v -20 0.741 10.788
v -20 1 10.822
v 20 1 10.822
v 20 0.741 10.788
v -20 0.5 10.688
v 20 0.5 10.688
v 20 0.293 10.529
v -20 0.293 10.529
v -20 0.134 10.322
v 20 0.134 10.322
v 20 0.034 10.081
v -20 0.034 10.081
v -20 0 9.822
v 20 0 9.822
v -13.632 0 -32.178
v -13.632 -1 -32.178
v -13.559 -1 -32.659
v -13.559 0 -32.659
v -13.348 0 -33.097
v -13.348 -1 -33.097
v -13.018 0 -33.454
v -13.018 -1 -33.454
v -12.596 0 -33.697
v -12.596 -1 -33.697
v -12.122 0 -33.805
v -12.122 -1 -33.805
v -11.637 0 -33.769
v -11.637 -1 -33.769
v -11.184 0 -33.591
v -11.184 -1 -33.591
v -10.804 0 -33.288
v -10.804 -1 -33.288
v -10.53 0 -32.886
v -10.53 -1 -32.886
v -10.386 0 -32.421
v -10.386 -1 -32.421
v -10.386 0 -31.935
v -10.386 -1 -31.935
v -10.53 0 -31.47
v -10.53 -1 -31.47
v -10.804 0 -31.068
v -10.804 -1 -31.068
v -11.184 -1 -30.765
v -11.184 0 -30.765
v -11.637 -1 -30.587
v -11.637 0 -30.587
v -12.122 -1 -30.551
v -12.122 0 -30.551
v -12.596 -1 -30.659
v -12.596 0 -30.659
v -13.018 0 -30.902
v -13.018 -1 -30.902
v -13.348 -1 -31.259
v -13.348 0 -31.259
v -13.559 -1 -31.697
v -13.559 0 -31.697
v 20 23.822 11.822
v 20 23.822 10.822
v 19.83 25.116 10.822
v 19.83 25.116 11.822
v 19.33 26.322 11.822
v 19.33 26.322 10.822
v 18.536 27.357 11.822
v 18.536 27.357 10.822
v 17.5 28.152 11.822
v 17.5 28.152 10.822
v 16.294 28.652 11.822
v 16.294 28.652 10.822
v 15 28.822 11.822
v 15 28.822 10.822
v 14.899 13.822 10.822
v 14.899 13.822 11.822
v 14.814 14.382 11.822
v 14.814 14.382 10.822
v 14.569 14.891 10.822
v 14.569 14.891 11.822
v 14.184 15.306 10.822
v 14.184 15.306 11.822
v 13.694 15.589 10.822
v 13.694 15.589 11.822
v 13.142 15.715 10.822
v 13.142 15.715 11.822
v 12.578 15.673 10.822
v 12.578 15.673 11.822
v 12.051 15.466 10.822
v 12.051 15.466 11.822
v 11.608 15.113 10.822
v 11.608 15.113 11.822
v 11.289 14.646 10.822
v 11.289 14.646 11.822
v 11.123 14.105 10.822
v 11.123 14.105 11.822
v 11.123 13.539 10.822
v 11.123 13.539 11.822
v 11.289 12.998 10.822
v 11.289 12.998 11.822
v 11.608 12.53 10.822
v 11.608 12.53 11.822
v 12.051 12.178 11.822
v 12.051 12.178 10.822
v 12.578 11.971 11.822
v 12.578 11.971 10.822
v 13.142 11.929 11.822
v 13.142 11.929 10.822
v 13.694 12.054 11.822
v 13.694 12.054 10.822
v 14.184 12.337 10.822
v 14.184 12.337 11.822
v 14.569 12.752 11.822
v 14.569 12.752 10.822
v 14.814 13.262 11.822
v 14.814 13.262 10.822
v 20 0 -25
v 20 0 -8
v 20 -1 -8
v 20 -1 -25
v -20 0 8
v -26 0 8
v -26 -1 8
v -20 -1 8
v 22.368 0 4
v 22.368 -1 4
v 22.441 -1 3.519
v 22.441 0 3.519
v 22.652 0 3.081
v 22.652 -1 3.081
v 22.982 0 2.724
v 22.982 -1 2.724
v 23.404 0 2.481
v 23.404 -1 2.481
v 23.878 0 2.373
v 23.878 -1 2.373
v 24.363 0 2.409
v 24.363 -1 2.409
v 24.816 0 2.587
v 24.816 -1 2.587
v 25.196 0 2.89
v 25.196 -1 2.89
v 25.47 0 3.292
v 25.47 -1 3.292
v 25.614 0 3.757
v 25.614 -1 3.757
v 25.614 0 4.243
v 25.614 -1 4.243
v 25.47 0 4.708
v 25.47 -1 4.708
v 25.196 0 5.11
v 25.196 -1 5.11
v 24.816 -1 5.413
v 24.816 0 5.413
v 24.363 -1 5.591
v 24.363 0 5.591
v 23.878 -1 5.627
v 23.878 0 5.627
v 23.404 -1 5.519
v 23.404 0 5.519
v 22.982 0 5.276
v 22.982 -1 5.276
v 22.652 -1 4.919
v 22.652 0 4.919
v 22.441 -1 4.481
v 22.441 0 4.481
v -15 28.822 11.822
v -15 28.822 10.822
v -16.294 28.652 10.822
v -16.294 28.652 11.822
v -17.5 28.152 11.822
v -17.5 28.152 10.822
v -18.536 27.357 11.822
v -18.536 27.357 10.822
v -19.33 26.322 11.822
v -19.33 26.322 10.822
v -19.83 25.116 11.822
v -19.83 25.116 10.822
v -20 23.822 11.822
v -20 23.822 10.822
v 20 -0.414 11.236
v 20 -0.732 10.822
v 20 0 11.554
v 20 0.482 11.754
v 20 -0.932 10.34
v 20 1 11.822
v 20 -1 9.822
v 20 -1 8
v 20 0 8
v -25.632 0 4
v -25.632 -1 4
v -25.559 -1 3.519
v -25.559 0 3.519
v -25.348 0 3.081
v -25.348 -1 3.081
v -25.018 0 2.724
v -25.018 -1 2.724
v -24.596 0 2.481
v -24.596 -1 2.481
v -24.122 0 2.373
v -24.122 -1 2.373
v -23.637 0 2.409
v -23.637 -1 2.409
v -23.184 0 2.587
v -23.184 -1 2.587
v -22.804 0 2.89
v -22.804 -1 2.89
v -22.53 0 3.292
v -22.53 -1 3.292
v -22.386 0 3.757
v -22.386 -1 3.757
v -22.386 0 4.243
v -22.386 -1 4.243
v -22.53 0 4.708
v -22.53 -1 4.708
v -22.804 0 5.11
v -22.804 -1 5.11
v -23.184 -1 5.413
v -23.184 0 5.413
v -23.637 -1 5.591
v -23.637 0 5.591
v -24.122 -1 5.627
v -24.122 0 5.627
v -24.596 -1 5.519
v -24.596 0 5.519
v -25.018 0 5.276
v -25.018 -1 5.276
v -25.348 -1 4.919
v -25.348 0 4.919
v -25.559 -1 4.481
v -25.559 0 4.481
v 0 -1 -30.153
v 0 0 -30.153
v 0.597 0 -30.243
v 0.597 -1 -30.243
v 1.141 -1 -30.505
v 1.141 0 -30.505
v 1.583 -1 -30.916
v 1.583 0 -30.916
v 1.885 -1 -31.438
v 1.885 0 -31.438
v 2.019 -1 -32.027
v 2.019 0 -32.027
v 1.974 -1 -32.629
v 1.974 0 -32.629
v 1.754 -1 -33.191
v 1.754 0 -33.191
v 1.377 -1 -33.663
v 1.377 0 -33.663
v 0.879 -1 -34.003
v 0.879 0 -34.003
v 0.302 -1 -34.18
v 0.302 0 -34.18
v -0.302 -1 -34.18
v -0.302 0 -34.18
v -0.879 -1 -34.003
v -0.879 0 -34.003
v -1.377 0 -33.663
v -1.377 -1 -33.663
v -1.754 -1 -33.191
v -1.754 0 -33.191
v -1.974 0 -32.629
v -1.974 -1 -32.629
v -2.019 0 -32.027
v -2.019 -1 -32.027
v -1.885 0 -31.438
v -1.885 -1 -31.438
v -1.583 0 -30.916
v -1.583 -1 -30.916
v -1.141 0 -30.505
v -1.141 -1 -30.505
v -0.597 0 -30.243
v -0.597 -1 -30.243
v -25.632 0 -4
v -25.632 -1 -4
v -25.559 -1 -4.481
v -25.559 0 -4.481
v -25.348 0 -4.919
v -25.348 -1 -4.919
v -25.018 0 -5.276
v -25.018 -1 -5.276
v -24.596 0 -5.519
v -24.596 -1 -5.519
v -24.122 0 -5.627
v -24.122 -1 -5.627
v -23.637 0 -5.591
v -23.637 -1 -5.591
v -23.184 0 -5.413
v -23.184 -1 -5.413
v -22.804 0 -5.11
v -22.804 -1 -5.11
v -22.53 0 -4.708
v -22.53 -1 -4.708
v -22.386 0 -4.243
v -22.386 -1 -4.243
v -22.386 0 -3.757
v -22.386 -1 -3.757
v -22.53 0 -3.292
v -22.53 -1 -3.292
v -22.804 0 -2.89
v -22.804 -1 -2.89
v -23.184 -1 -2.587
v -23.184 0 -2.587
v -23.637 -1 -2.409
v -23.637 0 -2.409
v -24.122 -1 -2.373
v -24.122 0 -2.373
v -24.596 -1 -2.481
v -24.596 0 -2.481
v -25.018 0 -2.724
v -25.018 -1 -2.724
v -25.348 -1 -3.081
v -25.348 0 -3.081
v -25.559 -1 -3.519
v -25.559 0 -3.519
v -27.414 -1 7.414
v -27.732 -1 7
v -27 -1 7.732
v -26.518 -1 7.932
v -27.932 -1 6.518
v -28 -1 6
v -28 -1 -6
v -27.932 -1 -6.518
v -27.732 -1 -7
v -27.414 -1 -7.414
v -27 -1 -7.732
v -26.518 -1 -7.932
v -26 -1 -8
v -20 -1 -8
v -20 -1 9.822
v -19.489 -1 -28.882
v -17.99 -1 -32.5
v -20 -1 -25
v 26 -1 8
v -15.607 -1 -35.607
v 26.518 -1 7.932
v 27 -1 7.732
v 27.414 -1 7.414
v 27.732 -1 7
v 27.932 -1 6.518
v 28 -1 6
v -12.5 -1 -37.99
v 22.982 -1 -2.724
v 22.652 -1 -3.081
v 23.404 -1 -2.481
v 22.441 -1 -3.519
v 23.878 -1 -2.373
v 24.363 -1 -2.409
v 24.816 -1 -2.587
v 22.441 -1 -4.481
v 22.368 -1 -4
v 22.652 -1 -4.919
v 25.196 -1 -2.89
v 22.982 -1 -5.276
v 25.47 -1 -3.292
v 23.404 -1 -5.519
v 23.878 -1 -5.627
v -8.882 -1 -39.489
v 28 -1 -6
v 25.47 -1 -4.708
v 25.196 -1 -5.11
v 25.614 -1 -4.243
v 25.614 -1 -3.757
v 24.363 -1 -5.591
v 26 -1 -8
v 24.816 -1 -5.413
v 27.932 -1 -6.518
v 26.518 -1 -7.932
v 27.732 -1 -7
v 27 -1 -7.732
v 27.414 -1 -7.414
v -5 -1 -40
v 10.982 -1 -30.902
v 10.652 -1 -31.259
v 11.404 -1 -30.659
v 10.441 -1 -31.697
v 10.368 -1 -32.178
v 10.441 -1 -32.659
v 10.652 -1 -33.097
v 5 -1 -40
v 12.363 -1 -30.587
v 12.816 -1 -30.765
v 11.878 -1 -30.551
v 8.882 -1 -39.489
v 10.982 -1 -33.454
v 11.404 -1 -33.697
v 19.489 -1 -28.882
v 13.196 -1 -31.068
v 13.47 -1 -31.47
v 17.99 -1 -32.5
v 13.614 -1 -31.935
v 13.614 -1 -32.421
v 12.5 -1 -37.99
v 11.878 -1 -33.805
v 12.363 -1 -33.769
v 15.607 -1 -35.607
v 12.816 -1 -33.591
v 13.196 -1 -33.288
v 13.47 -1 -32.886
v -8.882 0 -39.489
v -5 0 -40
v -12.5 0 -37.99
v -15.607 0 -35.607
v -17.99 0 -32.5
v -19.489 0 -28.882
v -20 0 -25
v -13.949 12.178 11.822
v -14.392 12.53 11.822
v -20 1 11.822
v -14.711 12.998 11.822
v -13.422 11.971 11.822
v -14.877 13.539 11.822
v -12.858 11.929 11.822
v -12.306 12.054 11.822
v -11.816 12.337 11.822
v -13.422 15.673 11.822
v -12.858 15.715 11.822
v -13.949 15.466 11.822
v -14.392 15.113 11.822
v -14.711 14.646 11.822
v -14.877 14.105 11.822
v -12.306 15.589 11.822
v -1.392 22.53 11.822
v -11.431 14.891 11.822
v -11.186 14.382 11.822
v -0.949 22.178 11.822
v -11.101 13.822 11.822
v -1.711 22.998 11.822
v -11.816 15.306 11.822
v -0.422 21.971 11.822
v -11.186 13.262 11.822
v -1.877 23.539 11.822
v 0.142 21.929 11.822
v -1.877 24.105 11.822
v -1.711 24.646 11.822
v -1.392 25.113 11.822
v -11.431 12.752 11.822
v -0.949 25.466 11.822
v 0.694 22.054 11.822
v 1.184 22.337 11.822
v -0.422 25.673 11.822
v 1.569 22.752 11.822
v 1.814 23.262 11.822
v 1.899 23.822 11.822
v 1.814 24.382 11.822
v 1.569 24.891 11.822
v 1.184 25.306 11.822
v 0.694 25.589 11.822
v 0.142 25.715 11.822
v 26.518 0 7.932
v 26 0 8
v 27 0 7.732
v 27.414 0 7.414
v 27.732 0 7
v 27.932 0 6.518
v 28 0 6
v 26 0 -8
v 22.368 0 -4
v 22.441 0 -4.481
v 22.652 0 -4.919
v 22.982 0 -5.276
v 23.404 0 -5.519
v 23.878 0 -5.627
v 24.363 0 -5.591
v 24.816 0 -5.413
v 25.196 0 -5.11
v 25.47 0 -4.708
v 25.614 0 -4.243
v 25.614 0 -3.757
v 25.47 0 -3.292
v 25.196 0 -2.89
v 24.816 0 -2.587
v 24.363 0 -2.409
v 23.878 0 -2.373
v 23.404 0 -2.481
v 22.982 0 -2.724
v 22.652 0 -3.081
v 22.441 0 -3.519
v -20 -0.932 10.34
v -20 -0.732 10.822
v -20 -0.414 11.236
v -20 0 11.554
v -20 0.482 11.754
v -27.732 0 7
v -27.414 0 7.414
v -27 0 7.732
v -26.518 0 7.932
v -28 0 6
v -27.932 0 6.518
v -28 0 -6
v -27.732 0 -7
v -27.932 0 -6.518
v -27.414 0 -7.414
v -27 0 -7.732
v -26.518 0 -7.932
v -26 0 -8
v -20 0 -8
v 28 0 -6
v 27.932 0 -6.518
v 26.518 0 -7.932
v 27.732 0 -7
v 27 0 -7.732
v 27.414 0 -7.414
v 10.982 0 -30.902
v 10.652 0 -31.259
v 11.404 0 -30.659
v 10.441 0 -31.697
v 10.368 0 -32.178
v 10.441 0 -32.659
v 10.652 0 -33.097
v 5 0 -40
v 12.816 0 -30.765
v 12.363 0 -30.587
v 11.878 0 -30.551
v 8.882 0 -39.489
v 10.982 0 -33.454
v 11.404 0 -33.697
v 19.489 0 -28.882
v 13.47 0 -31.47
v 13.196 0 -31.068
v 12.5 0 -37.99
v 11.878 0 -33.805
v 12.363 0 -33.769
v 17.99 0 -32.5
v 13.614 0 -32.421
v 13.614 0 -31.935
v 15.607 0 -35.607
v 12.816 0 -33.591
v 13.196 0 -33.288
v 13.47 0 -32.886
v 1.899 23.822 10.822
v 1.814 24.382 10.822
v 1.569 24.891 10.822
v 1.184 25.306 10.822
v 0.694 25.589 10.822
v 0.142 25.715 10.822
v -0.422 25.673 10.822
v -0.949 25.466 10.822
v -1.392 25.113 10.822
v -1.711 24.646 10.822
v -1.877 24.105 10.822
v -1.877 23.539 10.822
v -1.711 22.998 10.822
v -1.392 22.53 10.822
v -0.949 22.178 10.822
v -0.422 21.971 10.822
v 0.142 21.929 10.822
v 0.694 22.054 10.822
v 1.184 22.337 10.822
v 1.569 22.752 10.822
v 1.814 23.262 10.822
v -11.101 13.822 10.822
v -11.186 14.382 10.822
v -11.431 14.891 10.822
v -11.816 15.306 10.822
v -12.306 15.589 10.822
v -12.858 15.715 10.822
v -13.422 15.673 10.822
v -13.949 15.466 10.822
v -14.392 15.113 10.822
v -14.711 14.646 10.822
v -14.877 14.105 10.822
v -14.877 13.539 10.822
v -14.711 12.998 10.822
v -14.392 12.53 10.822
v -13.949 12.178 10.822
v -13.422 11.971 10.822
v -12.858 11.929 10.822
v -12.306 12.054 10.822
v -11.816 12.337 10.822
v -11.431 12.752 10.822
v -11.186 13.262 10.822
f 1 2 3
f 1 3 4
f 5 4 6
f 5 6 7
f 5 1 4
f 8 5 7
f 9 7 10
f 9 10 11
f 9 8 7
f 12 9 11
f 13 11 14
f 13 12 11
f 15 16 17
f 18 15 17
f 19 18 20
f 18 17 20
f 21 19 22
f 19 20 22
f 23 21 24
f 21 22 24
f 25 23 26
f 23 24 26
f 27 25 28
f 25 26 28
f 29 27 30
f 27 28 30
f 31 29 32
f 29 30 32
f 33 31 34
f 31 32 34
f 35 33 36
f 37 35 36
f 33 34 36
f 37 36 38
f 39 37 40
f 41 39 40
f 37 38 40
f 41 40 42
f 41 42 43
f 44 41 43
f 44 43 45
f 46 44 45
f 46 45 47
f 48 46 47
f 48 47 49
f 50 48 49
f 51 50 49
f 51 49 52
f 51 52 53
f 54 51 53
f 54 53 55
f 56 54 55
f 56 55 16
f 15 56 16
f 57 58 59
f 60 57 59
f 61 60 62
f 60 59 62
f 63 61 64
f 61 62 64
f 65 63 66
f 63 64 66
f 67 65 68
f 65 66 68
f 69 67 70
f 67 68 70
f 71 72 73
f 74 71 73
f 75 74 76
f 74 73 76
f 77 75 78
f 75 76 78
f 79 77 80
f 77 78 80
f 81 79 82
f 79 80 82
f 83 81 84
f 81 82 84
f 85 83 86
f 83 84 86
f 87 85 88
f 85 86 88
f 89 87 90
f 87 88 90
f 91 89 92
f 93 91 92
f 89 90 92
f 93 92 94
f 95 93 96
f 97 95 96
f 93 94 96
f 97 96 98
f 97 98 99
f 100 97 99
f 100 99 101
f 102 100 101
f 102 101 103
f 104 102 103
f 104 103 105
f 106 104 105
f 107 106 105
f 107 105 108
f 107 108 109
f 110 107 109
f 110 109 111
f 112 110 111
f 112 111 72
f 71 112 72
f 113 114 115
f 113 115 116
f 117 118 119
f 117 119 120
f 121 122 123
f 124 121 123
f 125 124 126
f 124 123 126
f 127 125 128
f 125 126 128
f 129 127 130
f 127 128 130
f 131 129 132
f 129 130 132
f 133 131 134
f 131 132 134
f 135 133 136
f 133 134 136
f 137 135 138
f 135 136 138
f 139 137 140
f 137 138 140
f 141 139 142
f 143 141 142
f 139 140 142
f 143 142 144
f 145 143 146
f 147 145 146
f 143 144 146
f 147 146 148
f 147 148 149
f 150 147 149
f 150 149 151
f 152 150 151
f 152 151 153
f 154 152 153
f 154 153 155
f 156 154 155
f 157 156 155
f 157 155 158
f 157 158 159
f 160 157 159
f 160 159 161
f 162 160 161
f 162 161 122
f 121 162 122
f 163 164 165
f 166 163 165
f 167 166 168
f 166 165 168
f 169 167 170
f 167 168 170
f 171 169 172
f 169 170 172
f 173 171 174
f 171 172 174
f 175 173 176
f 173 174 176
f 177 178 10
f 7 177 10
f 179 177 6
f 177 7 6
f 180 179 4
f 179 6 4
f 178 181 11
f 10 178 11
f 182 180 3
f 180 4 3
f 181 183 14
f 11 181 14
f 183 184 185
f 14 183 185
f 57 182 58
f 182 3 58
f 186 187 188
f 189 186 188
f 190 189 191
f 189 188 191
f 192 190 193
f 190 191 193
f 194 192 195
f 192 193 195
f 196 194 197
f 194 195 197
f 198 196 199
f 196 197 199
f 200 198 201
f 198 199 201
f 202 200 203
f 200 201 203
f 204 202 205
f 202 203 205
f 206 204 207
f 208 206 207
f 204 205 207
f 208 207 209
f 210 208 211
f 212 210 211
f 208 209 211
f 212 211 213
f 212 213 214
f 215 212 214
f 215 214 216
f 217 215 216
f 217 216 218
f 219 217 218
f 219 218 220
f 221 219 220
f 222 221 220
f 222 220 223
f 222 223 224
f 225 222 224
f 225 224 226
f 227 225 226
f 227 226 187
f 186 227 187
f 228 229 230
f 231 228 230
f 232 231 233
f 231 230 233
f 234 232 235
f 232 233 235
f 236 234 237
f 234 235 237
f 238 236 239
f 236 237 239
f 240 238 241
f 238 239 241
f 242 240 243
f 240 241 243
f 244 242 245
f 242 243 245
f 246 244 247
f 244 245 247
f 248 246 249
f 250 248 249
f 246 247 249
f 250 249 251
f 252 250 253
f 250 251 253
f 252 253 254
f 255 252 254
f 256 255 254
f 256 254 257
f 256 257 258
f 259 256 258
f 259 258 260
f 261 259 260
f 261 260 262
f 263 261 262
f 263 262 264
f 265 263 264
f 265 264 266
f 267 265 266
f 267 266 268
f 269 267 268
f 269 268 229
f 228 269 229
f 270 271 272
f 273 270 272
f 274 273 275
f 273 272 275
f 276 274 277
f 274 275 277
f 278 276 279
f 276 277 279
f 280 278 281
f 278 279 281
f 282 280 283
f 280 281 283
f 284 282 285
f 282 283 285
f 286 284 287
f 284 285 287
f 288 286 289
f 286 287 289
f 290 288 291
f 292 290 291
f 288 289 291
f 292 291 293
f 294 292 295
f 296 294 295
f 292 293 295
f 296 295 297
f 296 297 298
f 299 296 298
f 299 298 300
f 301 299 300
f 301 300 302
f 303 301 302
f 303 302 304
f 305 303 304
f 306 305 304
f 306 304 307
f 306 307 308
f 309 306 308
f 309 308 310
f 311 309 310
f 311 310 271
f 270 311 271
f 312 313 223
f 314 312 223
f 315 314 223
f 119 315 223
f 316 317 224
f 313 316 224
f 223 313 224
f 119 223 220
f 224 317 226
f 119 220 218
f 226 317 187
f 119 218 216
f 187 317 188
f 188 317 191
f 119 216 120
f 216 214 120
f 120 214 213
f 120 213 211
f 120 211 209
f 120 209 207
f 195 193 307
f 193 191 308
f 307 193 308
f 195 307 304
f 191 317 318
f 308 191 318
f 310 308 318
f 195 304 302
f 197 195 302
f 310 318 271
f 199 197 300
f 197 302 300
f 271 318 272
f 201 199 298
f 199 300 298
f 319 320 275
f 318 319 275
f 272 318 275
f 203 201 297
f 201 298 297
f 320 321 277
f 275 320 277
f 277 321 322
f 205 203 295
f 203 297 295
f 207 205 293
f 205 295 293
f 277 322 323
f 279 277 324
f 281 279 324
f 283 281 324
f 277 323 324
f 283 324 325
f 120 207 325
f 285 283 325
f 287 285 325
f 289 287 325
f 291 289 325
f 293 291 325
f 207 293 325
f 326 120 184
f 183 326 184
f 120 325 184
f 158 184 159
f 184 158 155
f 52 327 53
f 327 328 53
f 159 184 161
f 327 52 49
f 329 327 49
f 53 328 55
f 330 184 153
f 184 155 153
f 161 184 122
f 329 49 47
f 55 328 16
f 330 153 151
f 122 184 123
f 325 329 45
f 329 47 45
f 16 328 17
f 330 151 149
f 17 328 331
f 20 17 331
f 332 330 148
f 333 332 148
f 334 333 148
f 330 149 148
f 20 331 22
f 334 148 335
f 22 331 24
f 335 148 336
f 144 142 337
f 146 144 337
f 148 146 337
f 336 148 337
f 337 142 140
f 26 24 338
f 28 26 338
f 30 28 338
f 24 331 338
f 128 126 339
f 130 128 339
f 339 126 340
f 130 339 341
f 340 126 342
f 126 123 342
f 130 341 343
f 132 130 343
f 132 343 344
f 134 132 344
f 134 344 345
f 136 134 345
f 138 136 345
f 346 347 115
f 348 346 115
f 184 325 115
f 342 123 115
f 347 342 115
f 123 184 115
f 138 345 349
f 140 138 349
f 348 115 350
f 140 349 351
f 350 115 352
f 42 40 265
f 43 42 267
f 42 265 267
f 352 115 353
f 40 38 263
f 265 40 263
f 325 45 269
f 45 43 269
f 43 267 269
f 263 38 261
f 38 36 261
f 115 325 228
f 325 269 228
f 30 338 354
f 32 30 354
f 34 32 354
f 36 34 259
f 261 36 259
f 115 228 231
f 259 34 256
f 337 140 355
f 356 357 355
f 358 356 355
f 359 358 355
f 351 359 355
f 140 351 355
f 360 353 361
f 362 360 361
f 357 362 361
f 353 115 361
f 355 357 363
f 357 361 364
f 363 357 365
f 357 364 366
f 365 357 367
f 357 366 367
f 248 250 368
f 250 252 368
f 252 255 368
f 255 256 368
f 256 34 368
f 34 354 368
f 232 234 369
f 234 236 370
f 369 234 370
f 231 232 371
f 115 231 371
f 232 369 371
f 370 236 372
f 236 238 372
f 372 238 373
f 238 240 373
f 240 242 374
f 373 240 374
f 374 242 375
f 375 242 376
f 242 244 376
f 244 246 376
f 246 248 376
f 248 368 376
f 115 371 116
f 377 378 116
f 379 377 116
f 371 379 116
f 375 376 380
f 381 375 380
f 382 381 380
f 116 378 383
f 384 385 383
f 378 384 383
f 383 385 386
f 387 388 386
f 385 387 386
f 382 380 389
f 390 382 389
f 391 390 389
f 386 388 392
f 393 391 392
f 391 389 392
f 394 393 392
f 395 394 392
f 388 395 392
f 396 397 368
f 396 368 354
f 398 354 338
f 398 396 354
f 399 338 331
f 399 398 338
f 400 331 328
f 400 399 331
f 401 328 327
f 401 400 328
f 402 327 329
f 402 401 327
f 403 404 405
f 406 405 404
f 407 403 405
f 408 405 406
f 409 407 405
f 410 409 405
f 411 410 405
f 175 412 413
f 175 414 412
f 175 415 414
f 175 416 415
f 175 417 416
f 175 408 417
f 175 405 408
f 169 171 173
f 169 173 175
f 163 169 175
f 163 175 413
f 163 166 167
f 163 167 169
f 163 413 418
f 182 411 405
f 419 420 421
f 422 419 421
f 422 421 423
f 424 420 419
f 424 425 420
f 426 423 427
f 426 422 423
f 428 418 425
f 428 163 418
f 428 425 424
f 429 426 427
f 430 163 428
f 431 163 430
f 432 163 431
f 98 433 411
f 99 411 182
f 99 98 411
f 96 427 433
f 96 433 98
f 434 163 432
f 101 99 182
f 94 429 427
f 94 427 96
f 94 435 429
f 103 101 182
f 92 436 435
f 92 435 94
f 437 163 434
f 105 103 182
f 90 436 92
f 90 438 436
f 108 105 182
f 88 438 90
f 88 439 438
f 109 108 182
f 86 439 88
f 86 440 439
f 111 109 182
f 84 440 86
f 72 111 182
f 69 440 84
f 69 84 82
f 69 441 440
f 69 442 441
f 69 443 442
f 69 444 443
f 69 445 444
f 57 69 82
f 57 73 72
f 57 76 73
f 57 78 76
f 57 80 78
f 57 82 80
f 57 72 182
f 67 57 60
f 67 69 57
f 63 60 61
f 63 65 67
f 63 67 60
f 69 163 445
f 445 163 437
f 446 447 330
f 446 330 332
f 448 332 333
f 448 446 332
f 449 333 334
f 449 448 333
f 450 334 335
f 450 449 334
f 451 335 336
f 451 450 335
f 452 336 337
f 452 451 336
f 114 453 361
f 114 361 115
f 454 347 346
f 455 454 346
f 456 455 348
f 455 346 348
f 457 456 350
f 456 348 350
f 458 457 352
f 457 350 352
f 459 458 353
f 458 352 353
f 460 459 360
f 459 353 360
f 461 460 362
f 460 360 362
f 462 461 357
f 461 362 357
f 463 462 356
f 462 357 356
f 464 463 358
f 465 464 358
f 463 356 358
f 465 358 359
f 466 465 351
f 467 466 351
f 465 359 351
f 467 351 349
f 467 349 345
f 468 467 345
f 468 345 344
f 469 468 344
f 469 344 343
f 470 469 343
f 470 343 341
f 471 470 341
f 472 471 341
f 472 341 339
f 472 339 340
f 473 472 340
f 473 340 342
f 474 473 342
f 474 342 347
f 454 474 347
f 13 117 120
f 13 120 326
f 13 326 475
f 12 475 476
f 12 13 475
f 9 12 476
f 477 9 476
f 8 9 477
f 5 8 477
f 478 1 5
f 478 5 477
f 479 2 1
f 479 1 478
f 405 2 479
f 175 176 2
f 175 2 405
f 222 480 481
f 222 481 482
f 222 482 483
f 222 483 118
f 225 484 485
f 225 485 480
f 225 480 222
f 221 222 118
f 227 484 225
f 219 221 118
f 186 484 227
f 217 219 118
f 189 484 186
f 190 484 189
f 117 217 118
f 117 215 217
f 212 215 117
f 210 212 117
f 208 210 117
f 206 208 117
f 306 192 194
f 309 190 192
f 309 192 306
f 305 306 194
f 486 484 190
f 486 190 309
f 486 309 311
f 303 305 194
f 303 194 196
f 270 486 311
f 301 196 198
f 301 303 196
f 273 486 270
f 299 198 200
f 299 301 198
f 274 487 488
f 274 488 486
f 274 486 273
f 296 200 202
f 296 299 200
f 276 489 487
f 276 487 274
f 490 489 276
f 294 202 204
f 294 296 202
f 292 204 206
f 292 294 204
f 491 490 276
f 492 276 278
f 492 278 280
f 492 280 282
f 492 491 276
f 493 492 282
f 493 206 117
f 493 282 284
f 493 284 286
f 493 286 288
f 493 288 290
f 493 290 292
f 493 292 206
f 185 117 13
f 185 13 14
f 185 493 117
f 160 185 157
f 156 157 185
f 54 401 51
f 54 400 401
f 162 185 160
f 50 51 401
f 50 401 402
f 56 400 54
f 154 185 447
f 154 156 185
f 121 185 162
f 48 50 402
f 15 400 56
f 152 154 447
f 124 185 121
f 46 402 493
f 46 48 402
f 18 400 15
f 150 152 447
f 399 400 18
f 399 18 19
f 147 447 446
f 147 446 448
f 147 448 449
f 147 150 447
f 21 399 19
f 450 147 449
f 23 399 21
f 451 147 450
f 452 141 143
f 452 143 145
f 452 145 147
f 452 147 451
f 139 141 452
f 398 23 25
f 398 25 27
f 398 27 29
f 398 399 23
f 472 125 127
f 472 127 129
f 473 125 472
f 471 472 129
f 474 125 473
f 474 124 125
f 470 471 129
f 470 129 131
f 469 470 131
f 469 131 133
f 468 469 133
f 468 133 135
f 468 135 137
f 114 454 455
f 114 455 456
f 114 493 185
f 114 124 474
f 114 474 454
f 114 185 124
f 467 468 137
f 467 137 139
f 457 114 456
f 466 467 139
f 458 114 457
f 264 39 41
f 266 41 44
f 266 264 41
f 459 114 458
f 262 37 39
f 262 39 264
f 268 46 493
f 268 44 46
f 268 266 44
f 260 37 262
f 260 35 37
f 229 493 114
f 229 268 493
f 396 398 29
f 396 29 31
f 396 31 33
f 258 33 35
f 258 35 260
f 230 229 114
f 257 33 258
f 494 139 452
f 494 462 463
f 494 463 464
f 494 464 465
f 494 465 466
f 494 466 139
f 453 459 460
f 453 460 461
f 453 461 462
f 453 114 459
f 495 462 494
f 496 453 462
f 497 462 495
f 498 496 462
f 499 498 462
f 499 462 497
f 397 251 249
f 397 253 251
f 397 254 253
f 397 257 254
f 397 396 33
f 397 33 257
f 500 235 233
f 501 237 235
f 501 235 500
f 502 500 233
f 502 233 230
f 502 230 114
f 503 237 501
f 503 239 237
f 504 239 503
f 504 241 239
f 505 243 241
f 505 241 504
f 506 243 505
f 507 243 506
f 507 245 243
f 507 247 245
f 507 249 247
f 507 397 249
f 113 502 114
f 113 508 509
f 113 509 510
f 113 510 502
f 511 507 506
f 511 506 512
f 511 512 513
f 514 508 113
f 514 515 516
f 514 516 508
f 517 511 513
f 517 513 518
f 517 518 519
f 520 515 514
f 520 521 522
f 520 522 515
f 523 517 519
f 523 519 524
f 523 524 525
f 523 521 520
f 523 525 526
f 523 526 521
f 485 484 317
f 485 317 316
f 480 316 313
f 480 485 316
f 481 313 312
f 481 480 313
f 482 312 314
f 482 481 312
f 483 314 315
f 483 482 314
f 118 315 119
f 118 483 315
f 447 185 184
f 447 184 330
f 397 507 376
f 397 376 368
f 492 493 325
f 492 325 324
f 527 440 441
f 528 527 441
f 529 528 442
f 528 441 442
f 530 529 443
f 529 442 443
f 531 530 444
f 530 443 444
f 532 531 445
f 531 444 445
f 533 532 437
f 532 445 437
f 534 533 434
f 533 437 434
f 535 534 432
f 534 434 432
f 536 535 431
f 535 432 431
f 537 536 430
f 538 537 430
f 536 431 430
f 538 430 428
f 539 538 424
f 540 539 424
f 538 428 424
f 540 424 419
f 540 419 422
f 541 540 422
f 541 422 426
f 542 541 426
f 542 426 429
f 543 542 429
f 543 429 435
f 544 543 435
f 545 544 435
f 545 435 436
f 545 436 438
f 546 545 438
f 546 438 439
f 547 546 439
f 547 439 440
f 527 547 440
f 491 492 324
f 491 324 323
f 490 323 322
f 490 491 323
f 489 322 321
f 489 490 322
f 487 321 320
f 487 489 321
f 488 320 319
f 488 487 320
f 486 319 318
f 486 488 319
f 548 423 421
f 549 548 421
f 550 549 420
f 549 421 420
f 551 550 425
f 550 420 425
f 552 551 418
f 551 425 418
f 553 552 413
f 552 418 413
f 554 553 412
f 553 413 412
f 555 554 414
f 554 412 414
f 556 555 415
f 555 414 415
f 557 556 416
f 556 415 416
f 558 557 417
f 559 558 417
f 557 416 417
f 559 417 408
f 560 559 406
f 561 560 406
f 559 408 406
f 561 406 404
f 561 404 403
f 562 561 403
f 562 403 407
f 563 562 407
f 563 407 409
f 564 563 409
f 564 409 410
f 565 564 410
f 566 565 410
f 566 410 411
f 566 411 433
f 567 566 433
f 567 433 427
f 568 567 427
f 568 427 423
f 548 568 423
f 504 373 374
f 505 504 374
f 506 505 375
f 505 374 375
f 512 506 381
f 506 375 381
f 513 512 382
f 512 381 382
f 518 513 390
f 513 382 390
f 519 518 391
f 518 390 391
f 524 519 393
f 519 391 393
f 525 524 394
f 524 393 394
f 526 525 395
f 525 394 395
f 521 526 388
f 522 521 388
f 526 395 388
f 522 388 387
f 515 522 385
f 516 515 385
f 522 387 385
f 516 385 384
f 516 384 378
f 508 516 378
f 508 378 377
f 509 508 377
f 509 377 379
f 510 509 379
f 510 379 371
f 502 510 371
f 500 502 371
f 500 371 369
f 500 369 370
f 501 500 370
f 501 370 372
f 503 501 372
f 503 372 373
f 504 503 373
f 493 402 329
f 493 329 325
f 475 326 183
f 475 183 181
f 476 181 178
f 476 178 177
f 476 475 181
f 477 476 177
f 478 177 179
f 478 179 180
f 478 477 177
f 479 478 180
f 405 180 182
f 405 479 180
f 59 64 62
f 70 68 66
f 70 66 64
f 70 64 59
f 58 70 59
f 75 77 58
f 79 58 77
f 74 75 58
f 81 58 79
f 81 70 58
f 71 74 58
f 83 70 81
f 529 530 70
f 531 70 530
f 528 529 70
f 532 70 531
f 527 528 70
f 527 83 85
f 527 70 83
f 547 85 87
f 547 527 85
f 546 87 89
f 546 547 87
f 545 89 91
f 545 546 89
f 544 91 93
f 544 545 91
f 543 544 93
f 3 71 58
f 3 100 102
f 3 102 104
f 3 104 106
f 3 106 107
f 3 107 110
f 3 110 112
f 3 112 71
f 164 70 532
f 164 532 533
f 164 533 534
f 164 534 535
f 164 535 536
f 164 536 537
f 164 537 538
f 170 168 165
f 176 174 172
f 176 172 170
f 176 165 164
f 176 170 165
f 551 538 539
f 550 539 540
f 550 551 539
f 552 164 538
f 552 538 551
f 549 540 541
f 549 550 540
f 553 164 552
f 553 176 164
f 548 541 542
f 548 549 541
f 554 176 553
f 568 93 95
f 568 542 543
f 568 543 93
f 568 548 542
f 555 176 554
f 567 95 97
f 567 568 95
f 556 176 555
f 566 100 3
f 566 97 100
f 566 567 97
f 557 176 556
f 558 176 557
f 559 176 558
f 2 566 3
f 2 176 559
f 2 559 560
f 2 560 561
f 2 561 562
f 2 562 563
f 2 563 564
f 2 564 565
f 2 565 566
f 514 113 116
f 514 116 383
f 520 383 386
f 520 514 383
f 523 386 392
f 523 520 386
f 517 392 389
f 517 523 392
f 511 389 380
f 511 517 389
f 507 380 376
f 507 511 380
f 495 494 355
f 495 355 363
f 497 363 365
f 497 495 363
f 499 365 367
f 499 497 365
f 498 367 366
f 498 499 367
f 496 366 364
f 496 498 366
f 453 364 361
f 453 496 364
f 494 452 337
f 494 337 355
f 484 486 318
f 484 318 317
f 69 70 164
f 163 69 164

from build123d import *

# Parameters (mm, degrees)
BASE_FLANGE1_DEPTH       = 1
SKETCHED_START           = 11.616422755
SKETCHED_BEND1_OUTLINE_W = 40
SKETCHED_BEND1_OUTLINE_H = 1
SKETCHED_BEND1_DEPTH     = 28.383577245
SKETCHED_START_2         = 10.821902755
SKETCHED_BEND1_2_DEPTH   = 0.00548
SKETCHED_START_3         = 9.821902755
SKETCHED_BEND1_3_DEPTH   = 2
SKETCHED_START_4         = -20
SKETCHED_BEND1_4_DEPTH   = 40
SKETCH7_R                = 2.025
CUT_EXTRUDE1_DEPTH       = 10
F_6_CLEARANCE_HOLE1_D    = 3.7973
F_4_CLEARANCE_HOLE2_D    = 3.2639


with BuildPart() as part:
    # Base-Flange1: sheet metal written as solids
    # Sketch1 → Base-Flange1 (new body)
    with BuildSketch(Plane(origin=(0, 0, 0), x_dir=(1, 0, 0), z_dir=(0, 1, 0))):
        with BuildLine():
            Line((-20, -8), (-20, -35))
            ThreePointArc((-20, -35), (-18.535533906, -38.535533906), (-15, -40))
            Line((-15, -40), (15, -40))
            ThreePointArc((15, -40), (18.535533906, -38.535533906), (20, -35))
            Line((20, -35), (20, -8))
            Line((20, -8), (26, -8))
            ThreePointArc((26, -8), (27.414213562, -7.414213562), (28, -6))
            Line((28, -6), (28, 6))
            ThreePointArc((28, 6), (27.414213562, 7.414213562), (26, 8))
            Line((26, 8), (20, 8))
            Line((20, 8), (20, 25))
            ThreePointArc((20, 25), (15.606601718, 35.606601718), (5, 40))
            Line((5, 40), (-5, 40))
            ThreePointArc((-5, 40), (-15.606601718, 35.606601718), (-20, 25))
            Line((-20, 25), (-20, 8))
            Line((-20, 8), (-26, 8))
            ThreePointArc((-26, 8), (-27.414213562, 7.414213562), (-28, 6))
            Line((-28, 6), (-28, -6))
            ThreePointArc((-28, -6), (-27.414213562, -7.414213562), (-26, -8))
            Line((-26, -8), (-20, -8))
        make_face()
    extrude(amount=-BASE_FLANGE1_DEPTH)

    # Sketched Bend1: read off the stored shape, not the designer's step
    # Sketched Bend1 outline → Sketched Bend1 (cut)
    with BuildSketch(Plane.XY.offset(SKETCHED_START)):
        with Locations((0, -0.5)):
            Rectangle(SKETCHED_BEND1_OUTLINE_W, SKETCHED_BEND1_OUTLINE_H)
    extrude(amount=SKETCHED_BEND1_DEPTH, mode=Mode.SUBTRACT)

    # Sketched Bend1 2 outline → Sketched Bend1 2 (add)
    with BuildSketch(Plane.XY.offset(SKETCHED_START_2)):
        with BuildLine():
            Line((20, 0), (20, 23.821902755))
            ThreePointArc((20, 23.821902755), (18.535533906, 27.357436661), (15, 28.821902755))
            Line((15, 28.821902755), (-15, 28.821902755))
            ThreePointArc((-15, 28.821902755), (-18.535533906, 27.357436661), (-20, 23.821902755))
            Line((-20, 23.821902755), (-20, 0))
            Line((-20, 0), (20, 0))
        make_face()
    extrude(amount=SKETCHED_BEND1_2_DEPTH)

    # Sketched Bend1 3 outline → Sketched Bend1 3 (add)
    with BuildSketch(Plane.XY.offset(SKETCHED_START_3)):
        with BuildLine():
            Line((20, 0), (20, 23.821902755))
            ThreePointArc((20, 23.821902755), (18.535533906, 27.357436661), (15, 28.821902755))
            Line((15, 28.821902755), (-15, 28.821902755))
            ThreePointArc((-15, 28.821902755), (-18.535533906, 27.357436661), (-20, 23.821902755))
            Line((-20, 23.821902755), (-20, 0))
            Line((-20, 0), (20, 0))
        make_face()
    extrude(amount=SKETCHED_BEND1_3_DEPTH)

    # Sketched Bend1 4 outline → Sketched Bend1 4 (cut)
    with BuildSketch(Plane.YZ.offset(SKETCHED_START_4)):
        with BuildLine():
            Line((28.821902755, 9.821902755), (28.821902755, 10.821902755))
            Line((28.821902755, 10.821902755), (1, 10.821902755))
            ThreePointArc((1, 10.821902755), (0.292893219, 10.529009536), (0, 9.821902755))
            Line((0, 9.821902755), (28.821902755, 9.821902755))
        make_face()
        with BuildLine():
            ThreePointArc((-1, 9.821902755), (-0.414213562, 11.236116317), (1, 11.821902755))
            Line((1, 11.821902755), (0, 11.821902755))
            Line((0, 11.821902755), (0, 11.616422755))
            Line((0, 11.616422755), (-1, 11.616422755))
            Line((-1, 11.616422755), (-1, 9.821902755))
        make_face()
    extrude(amount=SKETCHED_BEND1_4_DEPTH, mode=Mode.SUBTRACT)

    # Sketch7 → Cut-Extrude1 (cut)
    with BuildSketch(Plane(origin=(0, 0, 0), x_dir=(1, 0, 0), z_dir=(0, 1, 0))):
        with Locations(Location((0, 32.178097245, 0), (0, 0, 270))):
            Circle(SKETCH7_R)
    extrude(amount=-CUT_EXTRUDE1_DEPTH, mode=Mode.SUBTRACT)

    # #6 Clearance Hole1 (through all)
    with Locations(Plane(origin=(0, 0, 10.821902755), x_dir=(-1, 0, 0), z_dir=(0, 0, -1))):
        with Locations((13, 13.821902755), (-13, 13.821902755), (0, 23.821902755)):
            Hole(F_6_CLEARANCE_HOLE1_D / 2)

    # #4 Clearance Hole2 (through all)
    with Locations(Plane(origin=(0, 0, 0), x_dir=(1, 0, 0), z_dir=(0, 1, 0))):
        with Locations((-24, 4), (-24, -4), (24, 4), (24, -4), (-12, 32.178097245), (12, 32.178097245)):
            Hole(F_4_CLEARANCE_HOLE2_D / 2)


solid = part.part
